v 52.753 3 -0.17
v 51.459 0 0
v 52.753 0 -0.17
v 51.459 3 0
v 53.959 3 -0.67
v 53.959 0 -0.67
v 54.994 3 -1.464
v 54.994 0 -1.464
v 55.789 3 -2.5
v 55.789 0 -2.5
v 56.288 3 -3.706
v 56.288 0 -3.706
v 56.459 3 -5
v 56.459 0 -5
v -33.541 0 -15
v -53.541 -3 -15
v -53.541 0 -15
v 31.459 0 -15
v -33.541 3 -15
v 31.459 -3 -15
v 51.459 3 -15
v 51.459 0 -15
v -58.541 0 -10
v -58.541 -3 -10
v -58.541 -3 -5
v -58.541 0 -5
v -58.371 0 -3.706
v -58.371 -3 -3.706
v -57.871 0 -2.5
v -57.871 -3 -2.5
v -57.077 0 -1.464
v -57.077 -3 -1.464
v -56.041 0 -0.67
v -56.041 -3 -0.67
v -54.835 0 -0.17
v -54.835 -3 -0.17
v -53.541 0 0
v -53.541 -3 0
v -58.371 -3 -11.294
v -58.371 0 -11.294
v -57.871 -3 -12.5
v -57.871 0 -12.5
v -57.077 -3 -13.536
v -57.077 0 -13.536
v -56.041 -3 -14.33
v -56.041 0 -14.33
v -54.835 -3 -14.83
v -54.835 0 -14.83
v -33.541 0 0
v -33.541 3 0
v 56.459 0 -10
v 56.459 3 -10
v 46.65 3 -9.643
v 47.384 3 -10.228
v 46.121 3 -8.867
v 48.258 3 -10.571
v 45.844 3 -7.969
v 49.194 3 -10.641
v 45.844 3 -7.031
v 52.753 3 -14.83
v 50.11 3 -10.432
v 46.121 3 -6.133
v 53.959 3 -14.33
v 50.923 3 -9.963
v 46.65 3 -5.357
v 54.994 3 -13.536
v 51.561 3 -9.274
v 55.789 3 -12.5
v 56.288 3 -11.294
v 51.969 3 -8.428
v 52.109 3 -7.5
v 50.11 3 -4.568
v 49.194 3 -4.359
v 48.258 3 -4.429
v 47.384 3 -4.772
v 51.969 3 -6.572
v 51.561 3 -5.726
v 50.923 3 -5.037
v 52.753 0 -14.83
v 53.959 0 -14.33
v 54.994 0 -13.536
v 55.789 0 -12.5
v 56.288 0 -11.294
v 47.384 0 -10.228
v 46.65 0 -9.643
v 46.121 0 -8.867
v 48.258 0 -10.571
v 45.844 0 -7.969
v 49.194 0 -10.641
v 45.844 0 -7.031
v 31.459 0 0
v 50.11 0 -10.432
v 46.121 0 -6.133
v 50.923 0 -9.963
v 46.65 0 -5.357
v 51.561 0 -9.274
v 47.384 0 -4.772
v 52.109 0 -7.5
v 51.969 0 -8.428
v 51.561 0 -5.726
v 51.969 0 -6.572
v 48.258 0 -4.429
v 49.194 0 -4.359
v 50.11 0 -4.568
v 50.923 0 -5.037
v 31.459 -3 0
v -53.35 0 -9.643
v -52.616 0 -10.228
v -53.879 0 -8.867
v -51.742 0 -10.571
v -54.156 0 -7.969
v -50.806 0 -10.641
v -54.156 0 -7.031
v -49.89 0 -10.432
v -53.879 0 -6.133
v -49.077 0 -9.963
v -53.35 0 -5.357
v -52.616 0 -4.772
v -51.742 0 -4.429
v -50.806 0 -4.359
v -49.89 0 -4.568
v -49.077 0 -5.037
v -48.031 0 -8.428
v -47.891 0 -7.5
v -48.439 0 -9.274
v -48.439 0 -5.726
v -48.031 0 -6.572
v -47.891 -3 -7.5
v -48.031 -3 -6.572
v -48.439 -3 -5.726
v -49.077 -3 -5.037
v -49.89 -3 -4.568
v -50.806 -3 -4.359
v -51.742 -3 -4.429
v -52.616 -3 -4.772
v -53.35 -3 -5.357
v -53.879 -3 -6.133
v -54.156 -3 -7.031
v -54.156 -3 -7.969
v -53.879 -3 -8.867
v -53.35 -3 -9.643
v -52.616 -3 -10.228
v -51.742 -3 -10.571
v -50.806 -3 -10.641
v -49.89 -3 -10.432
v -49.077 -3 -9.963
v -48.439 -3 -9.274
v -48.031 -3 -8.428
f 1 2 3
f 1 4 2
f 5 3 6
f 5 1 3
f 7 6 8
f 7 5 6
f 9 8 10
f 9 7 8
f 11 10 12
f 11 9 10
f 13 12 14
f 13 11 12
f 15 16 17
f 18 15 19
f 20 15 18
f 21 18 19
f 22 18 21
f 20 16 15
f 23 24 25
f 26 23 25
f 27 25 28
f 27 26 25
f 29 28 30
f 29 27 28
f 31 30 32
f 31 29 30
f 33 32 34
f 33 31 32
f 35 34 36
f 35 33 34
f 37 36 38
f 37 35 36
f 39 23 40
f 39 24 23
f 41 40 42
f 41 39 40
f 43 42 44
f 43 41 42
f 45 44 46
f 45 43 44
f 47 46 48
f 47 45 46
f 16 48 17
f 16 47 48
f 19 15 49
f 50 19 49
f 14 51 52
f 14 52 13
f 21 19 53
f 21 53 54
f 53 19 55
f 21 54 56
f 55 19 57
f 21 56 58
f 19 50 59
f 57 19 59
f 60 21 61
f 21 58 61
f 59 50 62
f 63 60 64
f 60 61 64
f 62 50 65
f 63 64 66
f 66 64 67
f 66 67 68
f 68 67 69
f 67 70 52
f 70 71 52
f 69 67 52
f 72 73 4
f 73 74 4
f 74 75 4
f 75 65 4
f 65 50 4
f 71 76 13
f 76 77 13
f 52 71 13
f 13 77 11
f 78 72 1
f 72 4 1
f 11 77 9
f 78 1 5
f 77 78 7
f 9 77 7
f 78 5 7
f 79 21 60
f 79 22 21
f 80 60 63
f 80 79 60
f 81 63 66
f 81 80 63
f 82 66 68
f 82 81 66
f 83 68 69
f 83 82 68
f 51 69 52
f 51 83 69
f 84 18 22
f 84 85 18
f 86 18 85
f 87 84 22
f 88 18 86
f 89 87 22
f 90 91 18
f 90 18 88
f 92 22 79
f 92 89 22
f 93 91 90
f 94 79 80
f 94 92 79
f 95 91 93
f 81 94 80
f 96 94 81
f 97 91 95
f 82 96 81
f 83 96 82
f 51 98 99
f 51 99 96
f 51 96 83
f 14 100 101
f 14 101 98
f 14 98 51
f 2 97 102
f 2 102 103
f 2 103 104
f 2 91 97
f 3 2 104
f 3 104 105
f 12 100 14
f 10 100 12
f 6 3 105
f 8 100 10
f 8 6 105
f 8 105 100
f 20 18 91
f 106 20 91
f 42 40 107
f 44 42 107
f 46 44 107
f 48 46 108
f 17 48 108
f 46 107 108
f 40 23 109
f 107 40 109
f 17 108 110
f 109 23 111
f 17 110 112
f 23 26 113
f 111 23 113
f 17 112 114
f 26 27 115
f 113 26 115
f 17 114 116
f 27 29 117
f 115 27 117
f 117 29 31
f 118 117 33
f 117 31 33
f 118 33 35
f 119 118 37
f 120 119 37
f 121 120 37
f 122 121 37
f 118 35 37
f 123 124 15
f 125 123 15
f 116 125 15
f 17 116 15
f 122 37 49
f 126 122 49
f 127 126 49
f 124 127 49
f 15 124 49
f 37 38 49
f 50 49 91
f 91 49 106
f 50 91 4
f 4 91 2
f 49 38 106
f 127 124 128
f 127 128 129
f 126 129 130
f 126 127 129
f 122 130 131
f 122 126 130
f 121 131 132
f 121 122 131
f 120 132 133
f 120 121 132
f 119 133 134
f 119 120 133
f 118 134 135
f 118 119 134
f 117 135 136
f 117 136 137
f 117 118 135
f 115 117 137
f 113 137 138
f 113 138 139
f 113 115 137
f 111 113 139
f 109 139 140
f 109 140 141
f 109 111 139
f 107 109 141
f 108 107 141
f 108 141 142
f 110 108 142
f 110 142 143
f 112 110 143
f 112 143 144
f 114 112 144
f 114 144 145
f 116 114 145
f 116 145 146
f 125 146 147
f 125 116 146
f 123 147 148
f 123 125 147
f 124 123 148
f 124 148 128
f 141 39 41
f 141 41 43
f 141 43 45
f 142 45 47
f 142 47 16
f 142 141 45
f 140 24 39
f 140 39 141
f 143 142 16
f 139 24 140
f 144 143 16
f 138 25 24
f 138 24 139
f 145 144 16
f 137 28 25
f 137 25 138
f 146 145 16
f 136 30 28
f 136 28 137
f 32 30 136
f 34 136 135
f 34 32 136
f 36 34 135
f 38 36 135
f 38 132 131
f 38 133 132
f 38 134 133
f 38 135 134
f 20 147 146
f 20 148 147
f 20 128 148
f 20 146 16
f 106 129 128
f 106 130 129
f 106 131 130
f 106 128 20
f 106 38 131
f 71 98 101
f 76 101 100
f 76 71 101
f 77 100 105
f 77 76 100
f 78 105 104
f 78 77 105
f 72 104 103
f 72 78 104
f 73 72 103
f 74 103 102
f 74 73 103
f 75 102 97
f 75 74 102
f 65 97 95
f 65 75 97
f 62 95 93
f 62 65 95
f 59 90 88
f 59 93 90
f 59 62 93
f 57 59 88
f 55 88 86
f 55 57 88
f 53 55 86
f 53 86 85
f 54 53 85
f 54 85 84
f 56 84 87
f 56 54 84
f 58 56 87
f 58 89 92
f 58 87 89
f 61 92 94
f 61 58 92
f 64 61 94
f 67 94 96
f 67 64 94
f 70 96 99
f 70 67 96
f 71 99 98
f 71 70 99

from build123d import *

# Parameters (mm, degrees)
F0_W     = 115
F0_H     = 15
F0_R     = 3.15
F1_DEPTH = 3
F2_W     = 25
F2_H     = 15
F4_DEPTH = 3
F3_W     = 25
F3_H     = 15
F5_DEPTH = 3
F6_R     = 5


with BuildPart() as f1:
    # F0 (on Front) → F1 (new body, symmetric)
    with BuildSketch(Plane.XZ):
        with Locations((-1.0412013265, -7.5)):
            Rectangle(F0_W, F0_H)
        with Locations((-51.0412013265, -7.5)):
            Circle(F0_R, mode=Mode.SUBTRACT)
        with Locations((48.9587986735, -7.5)):
            Circle(F0_R, mode=Mode.SUBTRACT)
    extrude(amount=F1_DEPTH, both=True)

    # F2 (on Front) → F4 (cut)
    with BuildSketch(Plane.XZ):
        with Locations((-46.0412013265, -7.5)):
            Rectangle(F2_W, F2_H)
    extrude(amount=-F4_DEPTH, mode=Mode.SUBTRACT)

    # F3 (on Front) → F5 (cut)
    with BuildSketch(Plane.XZ):
        with Locations((43.9587986735, -7.5)):
            Rectangle(F3_W, F3_H)
    extrude(amount=F5_DEPTH, mode=Mode.SUBTRACT)

    # F6
    f6_edges = [f1.edges().sort_by_distance(p)[0] for p in [
        (-58.541201, -1.5, 0),
        (-58.541201, -1.5, -15),
        (56.458799, 1.5, -15),
        (56.458799, 1.5, 0),
    ]]
    fillet(f6_edges, radius=F6_R)


solid = f1.part
